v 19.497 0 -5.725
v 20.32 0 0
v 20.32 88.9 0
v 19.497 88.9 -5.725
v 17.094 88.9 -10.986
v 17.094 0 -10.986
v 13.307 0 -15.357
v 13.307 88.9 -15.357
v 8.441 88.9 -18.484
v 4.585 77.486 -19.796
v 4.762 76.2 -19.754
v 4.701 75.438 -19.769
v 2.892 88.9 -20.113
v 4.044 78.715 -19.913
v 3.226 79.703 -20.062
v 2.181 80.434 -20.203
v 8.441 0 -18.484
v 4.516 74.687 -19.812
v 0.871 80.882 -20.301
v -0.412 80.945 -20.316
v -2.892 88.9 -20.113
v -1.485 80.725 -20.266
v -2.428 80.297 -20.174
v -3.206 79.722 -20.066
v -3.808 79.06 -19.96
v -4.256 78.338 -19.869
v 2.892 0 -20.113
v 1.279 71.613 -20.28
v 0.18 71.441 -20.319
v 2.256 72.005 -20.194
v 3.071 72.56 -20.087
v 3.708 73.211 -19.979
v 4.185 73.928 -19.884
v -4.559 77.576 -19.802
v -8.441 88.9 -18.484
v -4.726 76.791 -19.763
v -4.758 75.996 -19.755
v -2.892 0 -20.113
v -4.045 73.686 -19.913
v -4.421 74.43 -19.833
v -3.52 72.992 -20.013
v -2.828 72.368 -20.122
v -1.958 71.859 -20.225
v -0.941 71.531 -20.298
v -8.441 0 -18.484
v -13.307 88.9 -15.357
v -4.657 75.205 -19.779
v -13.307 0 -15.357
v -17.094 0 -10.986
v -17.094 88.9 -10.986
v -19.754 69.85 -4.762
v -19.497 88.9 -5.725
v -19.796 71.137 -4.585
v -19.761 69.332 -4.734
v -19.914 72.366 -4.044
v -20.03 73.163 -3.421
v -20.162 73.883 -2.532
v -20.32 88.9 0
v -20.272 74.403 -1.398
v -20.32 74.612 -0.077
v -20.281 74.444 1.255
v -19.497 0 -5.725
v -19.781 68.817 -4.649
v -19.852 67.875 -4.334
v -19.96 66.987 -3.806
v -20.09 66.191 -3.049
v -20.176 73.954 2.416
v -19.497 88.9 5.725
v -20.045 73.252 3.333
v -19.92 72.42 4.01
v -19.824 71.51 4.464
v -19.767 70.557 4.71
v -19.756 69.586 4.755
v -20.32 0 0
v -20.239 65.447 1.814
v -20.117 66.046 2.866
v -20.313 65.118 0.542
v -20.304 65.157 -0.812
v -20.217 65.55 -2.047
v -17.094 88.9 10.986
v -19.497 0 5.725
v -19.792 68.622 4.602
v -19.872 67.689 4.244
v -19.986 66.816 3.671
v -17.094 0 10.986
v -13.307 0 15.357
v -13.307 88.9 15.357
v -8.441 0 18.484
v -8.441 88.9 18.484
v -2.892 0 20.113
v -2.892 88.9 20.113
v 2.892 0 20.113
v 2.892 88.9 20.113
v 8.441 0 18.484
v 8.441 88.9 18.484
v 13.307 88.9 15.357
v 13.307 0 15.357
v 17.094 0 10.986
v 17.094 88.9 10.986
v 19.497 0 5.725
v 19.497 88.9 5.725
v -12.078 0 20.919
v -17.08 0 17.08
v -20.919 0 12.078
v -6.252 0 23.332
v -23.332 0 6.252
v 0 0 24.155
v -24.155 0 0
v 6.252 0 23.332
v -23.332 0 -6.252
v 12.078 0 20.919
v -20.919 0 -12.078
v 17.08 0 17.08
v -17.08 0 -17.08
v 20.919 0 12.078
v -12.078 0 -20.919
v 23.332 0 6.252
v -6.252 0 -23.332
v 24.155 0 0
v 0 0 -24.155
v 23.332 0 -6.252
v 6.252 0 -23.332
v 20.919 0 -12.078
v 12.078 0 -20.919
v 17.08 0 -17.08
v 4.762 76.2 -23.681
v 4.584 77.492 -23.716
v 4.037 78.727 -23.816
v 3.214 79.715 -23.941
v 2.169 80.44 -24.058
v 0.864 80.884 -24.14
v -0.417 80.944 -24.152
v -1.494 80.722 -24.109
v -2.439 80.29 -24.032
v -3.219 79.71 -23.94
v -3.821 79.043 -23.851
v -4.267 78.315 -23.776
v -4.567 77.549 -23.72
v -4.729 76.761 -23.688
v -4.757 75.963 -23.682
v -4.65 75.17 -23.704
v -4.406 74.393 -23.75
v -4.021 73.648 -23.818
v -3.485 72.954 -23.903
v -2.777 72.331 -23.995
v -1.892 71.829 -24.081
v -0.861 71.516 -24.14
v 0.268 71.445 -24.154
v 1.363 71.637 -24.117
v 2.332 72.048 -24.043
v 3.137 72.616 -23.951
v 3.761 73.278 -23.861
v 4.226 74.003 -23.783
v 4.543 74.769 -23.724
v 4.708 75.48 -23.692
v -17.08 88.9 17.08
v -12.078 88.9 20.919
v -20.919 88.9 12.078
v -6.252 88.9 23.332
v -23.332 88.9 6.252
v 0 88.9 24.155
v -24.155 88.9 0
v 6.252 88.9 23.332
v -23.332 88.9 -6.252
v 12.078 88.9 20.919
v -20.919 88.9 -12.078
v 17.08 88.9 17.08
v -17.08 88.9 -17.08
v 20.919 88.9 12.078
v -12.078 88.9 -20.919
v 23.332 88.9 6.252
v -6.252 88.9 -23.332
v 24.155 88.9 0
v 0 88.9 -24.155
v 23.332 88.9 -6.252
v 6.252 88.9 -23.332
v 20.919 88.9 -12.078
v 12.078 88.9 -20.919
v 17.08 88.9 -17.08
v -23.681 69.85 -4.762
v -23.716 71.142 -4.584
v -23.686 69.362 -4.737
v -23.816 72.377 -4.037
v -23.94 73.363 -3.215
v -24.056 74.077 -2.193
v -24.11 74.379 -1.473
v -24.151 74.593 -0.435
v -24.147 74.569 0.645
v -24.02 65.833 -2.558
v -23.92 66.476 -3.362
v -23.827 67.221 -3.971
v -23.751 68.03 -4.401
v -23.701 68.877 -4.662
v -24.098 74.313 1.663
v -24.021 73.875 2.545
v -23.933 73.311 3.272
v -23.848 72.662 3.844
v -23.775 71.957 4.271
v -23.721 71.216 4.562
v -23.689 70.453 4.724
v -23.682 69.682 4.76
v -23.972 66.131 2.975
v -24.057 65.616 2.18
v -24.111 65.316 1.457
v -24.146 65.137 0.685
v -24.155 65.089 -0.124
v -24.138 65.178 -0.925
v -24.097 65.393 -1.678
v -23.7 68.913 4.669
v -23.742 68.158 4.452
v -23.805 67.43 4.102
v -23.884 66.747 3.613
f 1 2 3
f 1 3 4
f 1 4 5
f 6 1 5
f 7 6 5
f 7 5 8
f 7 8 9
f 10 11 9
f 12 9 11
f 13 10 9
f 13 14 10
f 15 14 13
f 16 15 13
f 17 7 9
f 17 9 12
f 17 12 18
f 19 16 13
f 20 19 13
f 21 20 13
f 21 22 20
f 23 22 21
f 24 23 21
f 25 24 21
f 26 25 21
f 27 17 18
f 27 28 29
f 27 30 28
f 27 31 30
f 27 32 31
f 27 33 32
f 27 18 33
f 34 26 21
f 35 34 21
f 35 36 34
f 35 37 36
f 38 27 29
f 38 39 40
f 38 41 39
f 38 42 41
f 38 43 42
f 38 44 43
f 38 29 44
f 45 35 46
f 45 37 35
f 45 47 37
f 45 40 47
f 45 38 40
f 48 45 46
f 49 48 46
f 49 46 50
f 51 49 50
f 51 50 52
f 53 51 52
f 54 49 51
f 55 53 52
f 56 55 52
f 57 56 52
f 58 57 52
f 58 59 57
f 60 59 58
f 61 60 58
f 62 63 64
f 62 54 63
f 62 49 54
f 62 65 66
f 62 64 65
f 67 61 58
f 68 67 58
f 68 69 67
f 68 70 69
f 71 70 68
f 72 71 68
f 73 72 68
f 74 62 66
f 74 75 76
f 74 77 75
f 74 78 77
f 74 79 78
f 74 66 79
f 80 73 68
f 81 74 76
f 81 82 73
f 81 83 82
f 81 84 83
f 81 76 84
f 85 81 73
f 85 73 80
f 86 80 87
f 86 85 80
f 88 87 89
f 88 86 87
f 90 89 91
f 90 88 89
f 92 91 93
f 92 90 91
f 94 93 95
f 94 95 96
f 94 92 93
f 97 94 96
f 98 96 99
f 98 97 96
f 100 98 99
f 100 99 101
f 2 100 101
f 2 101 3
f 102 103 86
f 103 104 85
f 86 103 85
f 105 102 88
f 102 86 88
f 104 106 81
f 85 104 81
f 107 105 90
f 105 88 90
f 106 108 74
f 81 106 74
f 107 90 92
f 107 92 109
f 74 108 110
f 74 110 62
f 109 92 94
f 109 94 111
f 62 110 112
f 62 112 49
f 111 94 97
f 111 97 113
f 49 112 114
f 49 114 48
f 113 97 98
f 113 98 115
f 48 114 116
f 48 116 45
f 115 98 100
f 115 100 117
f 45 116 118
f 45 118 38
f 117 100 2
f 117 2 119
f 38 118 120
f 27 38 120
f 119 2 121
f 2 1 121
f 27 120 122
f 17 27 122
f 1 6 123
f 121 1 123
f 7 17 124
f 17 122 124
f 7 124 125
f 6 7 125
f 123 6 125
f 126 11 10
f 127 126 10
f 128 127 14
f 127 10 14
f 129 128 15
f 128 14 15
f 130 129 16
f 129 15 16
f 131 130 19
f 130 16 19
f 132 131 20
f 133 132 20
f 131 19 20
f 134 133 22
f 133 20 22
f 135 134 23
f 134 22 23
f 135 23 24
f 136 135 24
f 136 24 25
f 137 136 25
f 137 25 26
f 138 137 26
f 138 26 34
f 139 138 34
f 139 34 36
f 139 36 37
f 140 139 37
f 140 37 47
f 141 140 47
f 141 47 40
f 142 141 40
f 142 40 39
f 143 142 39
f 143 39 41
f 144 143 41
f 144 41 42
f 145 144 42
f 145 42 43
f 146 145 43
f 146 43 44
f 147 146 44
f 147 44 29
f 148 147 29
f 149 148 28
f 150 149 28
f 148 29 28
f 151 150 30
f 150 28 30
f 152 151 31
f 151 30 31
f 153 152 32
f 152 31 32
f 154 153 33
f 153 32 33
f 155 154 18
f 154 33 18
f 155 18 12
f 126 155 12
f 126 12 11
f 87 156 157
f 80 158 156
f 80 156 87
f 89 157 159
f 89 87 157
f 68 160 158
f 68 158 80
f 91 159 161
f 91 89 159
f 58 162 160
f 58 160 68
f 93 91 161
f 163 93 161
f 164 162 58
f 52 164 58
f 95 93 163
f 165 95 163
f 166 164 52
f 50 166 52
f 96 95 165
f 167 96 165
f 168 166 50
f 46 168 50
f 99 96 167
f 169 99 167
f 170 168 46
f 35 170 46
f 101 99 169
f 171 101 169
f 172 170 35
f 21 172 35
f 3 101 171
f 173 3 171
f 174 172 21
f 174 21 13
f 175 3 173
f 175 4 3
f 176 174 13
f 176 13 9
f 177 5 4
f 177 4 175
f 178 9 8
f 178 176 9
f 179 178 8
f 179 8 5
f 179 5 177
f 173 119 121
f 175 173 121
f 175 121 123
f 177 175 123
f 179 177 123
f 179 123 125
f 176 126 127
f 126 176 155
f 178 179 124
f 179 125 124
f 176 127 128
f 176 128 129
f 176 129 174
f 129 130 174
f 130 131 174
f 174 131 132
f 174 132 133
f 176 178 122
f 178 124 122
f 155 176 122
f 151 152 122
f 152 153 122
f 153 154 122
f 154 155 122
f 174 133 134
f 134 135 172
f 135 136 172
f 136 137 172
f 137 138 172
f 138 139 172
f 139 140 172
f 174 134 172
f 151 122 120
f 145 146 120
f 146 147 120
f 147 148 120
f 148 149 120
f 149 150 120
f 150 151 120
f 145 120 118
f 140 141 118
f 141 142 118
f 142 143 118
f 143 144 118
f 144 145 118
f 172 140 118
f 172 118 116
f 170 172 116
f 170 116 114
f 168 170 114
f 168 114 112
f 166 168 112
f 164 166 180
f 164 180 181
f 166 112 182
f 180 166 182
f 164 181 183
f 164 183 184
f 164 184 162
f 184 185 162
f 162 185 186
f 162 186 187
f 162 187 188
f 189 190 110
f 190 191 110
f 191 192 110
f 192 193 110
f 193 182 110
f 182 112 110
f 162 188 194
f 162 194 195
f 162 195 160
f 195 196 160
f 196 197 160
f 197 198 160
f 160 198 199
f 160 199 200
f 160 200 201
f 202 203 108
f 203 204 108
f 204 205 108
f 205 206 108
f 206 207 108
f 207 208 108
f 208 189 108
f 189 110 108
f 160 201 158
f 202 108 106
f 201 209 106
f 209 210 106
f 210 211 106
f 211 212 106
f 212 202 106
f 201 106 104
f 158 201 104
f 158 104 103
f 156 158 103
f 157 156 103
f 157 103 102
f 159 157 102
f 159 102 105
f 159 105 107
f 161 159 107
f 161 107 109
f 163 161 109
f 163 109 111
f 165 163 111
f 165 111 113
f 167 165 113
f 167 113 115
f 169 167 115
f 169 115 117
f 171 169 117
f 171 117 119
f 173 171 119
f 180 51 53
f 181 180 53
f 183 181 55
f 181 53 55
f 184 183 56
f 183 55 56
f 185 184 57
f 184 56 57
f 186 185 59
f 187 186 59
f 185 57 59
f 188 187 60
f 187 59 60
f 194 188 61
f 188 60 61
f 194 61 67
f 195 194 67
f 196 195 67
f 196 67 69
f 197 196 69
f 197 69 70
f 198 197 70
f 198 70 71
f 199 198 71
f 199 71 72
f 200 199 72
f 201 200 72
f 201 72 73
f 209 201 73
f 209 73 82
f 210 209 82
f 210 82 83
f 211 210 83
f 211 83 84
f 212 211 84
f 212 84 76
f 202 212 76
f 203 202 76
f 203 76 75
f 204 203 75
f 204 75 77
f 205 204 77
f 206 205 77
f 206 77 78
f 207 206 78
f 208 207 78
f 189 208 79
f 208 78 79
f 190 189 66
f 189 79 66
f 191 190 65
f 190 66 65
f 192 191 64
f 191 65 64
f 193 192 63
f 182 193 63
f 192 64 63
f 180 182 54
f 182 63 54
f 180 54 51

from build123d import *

# Parameters (mm, degrees)
SKETCH1_R           = 24.1554
SKETCH1_R_2         = 20.32
BOSS_EXTRUDE1_DEPTH = 88.9
SKETCH2_R           = 4.7625
CUT_EXTRUDE1_DEPTH  = 33.5788
SKETCH3_R           = 4.7625
CUT_EXTRUDE2_DEPTH  = 33.5788


with BuildPart() as part:
    # Sketch1 → Boss-Extrude1 (new body)
    with BuildSketch(Plane(origin=(0, 0, 0), x_dir=(1, 0, 0), z_dir=(0, 1, 0))):
        Circle(SKETCH1_R)
        Circle(SKETCH1_R_2, mode=Mode.SUBTRACT)
    extrude(amount=BOSS_EXTRUDE1_DEPTH)

    # Sketch2 → Cut-Extrude1 (cut)
    with BuildSketch(Plane.XY):
        with Locations((0, 76.2)):
            Circle(SKETCH2_R)
    extrude(amount=-CUT_EXTRUDE1_DEPTH, mode=Mode.SUBTRACT)

    # Sketch3 → Cut-Extrude2 (cut)
    with BuildSketch(Plane(origin=(0, 0, 0), x_dir=(0, 0, -1), z_dir=(1, 0, 0))):
        with Locations((0, 69.85)):
            Circle(SKETCH3_R)
    extrude(amount=-CUT_EXTRUDE2_DEPTH, mode=Mode.SUBTRACT)


solid = part.part
